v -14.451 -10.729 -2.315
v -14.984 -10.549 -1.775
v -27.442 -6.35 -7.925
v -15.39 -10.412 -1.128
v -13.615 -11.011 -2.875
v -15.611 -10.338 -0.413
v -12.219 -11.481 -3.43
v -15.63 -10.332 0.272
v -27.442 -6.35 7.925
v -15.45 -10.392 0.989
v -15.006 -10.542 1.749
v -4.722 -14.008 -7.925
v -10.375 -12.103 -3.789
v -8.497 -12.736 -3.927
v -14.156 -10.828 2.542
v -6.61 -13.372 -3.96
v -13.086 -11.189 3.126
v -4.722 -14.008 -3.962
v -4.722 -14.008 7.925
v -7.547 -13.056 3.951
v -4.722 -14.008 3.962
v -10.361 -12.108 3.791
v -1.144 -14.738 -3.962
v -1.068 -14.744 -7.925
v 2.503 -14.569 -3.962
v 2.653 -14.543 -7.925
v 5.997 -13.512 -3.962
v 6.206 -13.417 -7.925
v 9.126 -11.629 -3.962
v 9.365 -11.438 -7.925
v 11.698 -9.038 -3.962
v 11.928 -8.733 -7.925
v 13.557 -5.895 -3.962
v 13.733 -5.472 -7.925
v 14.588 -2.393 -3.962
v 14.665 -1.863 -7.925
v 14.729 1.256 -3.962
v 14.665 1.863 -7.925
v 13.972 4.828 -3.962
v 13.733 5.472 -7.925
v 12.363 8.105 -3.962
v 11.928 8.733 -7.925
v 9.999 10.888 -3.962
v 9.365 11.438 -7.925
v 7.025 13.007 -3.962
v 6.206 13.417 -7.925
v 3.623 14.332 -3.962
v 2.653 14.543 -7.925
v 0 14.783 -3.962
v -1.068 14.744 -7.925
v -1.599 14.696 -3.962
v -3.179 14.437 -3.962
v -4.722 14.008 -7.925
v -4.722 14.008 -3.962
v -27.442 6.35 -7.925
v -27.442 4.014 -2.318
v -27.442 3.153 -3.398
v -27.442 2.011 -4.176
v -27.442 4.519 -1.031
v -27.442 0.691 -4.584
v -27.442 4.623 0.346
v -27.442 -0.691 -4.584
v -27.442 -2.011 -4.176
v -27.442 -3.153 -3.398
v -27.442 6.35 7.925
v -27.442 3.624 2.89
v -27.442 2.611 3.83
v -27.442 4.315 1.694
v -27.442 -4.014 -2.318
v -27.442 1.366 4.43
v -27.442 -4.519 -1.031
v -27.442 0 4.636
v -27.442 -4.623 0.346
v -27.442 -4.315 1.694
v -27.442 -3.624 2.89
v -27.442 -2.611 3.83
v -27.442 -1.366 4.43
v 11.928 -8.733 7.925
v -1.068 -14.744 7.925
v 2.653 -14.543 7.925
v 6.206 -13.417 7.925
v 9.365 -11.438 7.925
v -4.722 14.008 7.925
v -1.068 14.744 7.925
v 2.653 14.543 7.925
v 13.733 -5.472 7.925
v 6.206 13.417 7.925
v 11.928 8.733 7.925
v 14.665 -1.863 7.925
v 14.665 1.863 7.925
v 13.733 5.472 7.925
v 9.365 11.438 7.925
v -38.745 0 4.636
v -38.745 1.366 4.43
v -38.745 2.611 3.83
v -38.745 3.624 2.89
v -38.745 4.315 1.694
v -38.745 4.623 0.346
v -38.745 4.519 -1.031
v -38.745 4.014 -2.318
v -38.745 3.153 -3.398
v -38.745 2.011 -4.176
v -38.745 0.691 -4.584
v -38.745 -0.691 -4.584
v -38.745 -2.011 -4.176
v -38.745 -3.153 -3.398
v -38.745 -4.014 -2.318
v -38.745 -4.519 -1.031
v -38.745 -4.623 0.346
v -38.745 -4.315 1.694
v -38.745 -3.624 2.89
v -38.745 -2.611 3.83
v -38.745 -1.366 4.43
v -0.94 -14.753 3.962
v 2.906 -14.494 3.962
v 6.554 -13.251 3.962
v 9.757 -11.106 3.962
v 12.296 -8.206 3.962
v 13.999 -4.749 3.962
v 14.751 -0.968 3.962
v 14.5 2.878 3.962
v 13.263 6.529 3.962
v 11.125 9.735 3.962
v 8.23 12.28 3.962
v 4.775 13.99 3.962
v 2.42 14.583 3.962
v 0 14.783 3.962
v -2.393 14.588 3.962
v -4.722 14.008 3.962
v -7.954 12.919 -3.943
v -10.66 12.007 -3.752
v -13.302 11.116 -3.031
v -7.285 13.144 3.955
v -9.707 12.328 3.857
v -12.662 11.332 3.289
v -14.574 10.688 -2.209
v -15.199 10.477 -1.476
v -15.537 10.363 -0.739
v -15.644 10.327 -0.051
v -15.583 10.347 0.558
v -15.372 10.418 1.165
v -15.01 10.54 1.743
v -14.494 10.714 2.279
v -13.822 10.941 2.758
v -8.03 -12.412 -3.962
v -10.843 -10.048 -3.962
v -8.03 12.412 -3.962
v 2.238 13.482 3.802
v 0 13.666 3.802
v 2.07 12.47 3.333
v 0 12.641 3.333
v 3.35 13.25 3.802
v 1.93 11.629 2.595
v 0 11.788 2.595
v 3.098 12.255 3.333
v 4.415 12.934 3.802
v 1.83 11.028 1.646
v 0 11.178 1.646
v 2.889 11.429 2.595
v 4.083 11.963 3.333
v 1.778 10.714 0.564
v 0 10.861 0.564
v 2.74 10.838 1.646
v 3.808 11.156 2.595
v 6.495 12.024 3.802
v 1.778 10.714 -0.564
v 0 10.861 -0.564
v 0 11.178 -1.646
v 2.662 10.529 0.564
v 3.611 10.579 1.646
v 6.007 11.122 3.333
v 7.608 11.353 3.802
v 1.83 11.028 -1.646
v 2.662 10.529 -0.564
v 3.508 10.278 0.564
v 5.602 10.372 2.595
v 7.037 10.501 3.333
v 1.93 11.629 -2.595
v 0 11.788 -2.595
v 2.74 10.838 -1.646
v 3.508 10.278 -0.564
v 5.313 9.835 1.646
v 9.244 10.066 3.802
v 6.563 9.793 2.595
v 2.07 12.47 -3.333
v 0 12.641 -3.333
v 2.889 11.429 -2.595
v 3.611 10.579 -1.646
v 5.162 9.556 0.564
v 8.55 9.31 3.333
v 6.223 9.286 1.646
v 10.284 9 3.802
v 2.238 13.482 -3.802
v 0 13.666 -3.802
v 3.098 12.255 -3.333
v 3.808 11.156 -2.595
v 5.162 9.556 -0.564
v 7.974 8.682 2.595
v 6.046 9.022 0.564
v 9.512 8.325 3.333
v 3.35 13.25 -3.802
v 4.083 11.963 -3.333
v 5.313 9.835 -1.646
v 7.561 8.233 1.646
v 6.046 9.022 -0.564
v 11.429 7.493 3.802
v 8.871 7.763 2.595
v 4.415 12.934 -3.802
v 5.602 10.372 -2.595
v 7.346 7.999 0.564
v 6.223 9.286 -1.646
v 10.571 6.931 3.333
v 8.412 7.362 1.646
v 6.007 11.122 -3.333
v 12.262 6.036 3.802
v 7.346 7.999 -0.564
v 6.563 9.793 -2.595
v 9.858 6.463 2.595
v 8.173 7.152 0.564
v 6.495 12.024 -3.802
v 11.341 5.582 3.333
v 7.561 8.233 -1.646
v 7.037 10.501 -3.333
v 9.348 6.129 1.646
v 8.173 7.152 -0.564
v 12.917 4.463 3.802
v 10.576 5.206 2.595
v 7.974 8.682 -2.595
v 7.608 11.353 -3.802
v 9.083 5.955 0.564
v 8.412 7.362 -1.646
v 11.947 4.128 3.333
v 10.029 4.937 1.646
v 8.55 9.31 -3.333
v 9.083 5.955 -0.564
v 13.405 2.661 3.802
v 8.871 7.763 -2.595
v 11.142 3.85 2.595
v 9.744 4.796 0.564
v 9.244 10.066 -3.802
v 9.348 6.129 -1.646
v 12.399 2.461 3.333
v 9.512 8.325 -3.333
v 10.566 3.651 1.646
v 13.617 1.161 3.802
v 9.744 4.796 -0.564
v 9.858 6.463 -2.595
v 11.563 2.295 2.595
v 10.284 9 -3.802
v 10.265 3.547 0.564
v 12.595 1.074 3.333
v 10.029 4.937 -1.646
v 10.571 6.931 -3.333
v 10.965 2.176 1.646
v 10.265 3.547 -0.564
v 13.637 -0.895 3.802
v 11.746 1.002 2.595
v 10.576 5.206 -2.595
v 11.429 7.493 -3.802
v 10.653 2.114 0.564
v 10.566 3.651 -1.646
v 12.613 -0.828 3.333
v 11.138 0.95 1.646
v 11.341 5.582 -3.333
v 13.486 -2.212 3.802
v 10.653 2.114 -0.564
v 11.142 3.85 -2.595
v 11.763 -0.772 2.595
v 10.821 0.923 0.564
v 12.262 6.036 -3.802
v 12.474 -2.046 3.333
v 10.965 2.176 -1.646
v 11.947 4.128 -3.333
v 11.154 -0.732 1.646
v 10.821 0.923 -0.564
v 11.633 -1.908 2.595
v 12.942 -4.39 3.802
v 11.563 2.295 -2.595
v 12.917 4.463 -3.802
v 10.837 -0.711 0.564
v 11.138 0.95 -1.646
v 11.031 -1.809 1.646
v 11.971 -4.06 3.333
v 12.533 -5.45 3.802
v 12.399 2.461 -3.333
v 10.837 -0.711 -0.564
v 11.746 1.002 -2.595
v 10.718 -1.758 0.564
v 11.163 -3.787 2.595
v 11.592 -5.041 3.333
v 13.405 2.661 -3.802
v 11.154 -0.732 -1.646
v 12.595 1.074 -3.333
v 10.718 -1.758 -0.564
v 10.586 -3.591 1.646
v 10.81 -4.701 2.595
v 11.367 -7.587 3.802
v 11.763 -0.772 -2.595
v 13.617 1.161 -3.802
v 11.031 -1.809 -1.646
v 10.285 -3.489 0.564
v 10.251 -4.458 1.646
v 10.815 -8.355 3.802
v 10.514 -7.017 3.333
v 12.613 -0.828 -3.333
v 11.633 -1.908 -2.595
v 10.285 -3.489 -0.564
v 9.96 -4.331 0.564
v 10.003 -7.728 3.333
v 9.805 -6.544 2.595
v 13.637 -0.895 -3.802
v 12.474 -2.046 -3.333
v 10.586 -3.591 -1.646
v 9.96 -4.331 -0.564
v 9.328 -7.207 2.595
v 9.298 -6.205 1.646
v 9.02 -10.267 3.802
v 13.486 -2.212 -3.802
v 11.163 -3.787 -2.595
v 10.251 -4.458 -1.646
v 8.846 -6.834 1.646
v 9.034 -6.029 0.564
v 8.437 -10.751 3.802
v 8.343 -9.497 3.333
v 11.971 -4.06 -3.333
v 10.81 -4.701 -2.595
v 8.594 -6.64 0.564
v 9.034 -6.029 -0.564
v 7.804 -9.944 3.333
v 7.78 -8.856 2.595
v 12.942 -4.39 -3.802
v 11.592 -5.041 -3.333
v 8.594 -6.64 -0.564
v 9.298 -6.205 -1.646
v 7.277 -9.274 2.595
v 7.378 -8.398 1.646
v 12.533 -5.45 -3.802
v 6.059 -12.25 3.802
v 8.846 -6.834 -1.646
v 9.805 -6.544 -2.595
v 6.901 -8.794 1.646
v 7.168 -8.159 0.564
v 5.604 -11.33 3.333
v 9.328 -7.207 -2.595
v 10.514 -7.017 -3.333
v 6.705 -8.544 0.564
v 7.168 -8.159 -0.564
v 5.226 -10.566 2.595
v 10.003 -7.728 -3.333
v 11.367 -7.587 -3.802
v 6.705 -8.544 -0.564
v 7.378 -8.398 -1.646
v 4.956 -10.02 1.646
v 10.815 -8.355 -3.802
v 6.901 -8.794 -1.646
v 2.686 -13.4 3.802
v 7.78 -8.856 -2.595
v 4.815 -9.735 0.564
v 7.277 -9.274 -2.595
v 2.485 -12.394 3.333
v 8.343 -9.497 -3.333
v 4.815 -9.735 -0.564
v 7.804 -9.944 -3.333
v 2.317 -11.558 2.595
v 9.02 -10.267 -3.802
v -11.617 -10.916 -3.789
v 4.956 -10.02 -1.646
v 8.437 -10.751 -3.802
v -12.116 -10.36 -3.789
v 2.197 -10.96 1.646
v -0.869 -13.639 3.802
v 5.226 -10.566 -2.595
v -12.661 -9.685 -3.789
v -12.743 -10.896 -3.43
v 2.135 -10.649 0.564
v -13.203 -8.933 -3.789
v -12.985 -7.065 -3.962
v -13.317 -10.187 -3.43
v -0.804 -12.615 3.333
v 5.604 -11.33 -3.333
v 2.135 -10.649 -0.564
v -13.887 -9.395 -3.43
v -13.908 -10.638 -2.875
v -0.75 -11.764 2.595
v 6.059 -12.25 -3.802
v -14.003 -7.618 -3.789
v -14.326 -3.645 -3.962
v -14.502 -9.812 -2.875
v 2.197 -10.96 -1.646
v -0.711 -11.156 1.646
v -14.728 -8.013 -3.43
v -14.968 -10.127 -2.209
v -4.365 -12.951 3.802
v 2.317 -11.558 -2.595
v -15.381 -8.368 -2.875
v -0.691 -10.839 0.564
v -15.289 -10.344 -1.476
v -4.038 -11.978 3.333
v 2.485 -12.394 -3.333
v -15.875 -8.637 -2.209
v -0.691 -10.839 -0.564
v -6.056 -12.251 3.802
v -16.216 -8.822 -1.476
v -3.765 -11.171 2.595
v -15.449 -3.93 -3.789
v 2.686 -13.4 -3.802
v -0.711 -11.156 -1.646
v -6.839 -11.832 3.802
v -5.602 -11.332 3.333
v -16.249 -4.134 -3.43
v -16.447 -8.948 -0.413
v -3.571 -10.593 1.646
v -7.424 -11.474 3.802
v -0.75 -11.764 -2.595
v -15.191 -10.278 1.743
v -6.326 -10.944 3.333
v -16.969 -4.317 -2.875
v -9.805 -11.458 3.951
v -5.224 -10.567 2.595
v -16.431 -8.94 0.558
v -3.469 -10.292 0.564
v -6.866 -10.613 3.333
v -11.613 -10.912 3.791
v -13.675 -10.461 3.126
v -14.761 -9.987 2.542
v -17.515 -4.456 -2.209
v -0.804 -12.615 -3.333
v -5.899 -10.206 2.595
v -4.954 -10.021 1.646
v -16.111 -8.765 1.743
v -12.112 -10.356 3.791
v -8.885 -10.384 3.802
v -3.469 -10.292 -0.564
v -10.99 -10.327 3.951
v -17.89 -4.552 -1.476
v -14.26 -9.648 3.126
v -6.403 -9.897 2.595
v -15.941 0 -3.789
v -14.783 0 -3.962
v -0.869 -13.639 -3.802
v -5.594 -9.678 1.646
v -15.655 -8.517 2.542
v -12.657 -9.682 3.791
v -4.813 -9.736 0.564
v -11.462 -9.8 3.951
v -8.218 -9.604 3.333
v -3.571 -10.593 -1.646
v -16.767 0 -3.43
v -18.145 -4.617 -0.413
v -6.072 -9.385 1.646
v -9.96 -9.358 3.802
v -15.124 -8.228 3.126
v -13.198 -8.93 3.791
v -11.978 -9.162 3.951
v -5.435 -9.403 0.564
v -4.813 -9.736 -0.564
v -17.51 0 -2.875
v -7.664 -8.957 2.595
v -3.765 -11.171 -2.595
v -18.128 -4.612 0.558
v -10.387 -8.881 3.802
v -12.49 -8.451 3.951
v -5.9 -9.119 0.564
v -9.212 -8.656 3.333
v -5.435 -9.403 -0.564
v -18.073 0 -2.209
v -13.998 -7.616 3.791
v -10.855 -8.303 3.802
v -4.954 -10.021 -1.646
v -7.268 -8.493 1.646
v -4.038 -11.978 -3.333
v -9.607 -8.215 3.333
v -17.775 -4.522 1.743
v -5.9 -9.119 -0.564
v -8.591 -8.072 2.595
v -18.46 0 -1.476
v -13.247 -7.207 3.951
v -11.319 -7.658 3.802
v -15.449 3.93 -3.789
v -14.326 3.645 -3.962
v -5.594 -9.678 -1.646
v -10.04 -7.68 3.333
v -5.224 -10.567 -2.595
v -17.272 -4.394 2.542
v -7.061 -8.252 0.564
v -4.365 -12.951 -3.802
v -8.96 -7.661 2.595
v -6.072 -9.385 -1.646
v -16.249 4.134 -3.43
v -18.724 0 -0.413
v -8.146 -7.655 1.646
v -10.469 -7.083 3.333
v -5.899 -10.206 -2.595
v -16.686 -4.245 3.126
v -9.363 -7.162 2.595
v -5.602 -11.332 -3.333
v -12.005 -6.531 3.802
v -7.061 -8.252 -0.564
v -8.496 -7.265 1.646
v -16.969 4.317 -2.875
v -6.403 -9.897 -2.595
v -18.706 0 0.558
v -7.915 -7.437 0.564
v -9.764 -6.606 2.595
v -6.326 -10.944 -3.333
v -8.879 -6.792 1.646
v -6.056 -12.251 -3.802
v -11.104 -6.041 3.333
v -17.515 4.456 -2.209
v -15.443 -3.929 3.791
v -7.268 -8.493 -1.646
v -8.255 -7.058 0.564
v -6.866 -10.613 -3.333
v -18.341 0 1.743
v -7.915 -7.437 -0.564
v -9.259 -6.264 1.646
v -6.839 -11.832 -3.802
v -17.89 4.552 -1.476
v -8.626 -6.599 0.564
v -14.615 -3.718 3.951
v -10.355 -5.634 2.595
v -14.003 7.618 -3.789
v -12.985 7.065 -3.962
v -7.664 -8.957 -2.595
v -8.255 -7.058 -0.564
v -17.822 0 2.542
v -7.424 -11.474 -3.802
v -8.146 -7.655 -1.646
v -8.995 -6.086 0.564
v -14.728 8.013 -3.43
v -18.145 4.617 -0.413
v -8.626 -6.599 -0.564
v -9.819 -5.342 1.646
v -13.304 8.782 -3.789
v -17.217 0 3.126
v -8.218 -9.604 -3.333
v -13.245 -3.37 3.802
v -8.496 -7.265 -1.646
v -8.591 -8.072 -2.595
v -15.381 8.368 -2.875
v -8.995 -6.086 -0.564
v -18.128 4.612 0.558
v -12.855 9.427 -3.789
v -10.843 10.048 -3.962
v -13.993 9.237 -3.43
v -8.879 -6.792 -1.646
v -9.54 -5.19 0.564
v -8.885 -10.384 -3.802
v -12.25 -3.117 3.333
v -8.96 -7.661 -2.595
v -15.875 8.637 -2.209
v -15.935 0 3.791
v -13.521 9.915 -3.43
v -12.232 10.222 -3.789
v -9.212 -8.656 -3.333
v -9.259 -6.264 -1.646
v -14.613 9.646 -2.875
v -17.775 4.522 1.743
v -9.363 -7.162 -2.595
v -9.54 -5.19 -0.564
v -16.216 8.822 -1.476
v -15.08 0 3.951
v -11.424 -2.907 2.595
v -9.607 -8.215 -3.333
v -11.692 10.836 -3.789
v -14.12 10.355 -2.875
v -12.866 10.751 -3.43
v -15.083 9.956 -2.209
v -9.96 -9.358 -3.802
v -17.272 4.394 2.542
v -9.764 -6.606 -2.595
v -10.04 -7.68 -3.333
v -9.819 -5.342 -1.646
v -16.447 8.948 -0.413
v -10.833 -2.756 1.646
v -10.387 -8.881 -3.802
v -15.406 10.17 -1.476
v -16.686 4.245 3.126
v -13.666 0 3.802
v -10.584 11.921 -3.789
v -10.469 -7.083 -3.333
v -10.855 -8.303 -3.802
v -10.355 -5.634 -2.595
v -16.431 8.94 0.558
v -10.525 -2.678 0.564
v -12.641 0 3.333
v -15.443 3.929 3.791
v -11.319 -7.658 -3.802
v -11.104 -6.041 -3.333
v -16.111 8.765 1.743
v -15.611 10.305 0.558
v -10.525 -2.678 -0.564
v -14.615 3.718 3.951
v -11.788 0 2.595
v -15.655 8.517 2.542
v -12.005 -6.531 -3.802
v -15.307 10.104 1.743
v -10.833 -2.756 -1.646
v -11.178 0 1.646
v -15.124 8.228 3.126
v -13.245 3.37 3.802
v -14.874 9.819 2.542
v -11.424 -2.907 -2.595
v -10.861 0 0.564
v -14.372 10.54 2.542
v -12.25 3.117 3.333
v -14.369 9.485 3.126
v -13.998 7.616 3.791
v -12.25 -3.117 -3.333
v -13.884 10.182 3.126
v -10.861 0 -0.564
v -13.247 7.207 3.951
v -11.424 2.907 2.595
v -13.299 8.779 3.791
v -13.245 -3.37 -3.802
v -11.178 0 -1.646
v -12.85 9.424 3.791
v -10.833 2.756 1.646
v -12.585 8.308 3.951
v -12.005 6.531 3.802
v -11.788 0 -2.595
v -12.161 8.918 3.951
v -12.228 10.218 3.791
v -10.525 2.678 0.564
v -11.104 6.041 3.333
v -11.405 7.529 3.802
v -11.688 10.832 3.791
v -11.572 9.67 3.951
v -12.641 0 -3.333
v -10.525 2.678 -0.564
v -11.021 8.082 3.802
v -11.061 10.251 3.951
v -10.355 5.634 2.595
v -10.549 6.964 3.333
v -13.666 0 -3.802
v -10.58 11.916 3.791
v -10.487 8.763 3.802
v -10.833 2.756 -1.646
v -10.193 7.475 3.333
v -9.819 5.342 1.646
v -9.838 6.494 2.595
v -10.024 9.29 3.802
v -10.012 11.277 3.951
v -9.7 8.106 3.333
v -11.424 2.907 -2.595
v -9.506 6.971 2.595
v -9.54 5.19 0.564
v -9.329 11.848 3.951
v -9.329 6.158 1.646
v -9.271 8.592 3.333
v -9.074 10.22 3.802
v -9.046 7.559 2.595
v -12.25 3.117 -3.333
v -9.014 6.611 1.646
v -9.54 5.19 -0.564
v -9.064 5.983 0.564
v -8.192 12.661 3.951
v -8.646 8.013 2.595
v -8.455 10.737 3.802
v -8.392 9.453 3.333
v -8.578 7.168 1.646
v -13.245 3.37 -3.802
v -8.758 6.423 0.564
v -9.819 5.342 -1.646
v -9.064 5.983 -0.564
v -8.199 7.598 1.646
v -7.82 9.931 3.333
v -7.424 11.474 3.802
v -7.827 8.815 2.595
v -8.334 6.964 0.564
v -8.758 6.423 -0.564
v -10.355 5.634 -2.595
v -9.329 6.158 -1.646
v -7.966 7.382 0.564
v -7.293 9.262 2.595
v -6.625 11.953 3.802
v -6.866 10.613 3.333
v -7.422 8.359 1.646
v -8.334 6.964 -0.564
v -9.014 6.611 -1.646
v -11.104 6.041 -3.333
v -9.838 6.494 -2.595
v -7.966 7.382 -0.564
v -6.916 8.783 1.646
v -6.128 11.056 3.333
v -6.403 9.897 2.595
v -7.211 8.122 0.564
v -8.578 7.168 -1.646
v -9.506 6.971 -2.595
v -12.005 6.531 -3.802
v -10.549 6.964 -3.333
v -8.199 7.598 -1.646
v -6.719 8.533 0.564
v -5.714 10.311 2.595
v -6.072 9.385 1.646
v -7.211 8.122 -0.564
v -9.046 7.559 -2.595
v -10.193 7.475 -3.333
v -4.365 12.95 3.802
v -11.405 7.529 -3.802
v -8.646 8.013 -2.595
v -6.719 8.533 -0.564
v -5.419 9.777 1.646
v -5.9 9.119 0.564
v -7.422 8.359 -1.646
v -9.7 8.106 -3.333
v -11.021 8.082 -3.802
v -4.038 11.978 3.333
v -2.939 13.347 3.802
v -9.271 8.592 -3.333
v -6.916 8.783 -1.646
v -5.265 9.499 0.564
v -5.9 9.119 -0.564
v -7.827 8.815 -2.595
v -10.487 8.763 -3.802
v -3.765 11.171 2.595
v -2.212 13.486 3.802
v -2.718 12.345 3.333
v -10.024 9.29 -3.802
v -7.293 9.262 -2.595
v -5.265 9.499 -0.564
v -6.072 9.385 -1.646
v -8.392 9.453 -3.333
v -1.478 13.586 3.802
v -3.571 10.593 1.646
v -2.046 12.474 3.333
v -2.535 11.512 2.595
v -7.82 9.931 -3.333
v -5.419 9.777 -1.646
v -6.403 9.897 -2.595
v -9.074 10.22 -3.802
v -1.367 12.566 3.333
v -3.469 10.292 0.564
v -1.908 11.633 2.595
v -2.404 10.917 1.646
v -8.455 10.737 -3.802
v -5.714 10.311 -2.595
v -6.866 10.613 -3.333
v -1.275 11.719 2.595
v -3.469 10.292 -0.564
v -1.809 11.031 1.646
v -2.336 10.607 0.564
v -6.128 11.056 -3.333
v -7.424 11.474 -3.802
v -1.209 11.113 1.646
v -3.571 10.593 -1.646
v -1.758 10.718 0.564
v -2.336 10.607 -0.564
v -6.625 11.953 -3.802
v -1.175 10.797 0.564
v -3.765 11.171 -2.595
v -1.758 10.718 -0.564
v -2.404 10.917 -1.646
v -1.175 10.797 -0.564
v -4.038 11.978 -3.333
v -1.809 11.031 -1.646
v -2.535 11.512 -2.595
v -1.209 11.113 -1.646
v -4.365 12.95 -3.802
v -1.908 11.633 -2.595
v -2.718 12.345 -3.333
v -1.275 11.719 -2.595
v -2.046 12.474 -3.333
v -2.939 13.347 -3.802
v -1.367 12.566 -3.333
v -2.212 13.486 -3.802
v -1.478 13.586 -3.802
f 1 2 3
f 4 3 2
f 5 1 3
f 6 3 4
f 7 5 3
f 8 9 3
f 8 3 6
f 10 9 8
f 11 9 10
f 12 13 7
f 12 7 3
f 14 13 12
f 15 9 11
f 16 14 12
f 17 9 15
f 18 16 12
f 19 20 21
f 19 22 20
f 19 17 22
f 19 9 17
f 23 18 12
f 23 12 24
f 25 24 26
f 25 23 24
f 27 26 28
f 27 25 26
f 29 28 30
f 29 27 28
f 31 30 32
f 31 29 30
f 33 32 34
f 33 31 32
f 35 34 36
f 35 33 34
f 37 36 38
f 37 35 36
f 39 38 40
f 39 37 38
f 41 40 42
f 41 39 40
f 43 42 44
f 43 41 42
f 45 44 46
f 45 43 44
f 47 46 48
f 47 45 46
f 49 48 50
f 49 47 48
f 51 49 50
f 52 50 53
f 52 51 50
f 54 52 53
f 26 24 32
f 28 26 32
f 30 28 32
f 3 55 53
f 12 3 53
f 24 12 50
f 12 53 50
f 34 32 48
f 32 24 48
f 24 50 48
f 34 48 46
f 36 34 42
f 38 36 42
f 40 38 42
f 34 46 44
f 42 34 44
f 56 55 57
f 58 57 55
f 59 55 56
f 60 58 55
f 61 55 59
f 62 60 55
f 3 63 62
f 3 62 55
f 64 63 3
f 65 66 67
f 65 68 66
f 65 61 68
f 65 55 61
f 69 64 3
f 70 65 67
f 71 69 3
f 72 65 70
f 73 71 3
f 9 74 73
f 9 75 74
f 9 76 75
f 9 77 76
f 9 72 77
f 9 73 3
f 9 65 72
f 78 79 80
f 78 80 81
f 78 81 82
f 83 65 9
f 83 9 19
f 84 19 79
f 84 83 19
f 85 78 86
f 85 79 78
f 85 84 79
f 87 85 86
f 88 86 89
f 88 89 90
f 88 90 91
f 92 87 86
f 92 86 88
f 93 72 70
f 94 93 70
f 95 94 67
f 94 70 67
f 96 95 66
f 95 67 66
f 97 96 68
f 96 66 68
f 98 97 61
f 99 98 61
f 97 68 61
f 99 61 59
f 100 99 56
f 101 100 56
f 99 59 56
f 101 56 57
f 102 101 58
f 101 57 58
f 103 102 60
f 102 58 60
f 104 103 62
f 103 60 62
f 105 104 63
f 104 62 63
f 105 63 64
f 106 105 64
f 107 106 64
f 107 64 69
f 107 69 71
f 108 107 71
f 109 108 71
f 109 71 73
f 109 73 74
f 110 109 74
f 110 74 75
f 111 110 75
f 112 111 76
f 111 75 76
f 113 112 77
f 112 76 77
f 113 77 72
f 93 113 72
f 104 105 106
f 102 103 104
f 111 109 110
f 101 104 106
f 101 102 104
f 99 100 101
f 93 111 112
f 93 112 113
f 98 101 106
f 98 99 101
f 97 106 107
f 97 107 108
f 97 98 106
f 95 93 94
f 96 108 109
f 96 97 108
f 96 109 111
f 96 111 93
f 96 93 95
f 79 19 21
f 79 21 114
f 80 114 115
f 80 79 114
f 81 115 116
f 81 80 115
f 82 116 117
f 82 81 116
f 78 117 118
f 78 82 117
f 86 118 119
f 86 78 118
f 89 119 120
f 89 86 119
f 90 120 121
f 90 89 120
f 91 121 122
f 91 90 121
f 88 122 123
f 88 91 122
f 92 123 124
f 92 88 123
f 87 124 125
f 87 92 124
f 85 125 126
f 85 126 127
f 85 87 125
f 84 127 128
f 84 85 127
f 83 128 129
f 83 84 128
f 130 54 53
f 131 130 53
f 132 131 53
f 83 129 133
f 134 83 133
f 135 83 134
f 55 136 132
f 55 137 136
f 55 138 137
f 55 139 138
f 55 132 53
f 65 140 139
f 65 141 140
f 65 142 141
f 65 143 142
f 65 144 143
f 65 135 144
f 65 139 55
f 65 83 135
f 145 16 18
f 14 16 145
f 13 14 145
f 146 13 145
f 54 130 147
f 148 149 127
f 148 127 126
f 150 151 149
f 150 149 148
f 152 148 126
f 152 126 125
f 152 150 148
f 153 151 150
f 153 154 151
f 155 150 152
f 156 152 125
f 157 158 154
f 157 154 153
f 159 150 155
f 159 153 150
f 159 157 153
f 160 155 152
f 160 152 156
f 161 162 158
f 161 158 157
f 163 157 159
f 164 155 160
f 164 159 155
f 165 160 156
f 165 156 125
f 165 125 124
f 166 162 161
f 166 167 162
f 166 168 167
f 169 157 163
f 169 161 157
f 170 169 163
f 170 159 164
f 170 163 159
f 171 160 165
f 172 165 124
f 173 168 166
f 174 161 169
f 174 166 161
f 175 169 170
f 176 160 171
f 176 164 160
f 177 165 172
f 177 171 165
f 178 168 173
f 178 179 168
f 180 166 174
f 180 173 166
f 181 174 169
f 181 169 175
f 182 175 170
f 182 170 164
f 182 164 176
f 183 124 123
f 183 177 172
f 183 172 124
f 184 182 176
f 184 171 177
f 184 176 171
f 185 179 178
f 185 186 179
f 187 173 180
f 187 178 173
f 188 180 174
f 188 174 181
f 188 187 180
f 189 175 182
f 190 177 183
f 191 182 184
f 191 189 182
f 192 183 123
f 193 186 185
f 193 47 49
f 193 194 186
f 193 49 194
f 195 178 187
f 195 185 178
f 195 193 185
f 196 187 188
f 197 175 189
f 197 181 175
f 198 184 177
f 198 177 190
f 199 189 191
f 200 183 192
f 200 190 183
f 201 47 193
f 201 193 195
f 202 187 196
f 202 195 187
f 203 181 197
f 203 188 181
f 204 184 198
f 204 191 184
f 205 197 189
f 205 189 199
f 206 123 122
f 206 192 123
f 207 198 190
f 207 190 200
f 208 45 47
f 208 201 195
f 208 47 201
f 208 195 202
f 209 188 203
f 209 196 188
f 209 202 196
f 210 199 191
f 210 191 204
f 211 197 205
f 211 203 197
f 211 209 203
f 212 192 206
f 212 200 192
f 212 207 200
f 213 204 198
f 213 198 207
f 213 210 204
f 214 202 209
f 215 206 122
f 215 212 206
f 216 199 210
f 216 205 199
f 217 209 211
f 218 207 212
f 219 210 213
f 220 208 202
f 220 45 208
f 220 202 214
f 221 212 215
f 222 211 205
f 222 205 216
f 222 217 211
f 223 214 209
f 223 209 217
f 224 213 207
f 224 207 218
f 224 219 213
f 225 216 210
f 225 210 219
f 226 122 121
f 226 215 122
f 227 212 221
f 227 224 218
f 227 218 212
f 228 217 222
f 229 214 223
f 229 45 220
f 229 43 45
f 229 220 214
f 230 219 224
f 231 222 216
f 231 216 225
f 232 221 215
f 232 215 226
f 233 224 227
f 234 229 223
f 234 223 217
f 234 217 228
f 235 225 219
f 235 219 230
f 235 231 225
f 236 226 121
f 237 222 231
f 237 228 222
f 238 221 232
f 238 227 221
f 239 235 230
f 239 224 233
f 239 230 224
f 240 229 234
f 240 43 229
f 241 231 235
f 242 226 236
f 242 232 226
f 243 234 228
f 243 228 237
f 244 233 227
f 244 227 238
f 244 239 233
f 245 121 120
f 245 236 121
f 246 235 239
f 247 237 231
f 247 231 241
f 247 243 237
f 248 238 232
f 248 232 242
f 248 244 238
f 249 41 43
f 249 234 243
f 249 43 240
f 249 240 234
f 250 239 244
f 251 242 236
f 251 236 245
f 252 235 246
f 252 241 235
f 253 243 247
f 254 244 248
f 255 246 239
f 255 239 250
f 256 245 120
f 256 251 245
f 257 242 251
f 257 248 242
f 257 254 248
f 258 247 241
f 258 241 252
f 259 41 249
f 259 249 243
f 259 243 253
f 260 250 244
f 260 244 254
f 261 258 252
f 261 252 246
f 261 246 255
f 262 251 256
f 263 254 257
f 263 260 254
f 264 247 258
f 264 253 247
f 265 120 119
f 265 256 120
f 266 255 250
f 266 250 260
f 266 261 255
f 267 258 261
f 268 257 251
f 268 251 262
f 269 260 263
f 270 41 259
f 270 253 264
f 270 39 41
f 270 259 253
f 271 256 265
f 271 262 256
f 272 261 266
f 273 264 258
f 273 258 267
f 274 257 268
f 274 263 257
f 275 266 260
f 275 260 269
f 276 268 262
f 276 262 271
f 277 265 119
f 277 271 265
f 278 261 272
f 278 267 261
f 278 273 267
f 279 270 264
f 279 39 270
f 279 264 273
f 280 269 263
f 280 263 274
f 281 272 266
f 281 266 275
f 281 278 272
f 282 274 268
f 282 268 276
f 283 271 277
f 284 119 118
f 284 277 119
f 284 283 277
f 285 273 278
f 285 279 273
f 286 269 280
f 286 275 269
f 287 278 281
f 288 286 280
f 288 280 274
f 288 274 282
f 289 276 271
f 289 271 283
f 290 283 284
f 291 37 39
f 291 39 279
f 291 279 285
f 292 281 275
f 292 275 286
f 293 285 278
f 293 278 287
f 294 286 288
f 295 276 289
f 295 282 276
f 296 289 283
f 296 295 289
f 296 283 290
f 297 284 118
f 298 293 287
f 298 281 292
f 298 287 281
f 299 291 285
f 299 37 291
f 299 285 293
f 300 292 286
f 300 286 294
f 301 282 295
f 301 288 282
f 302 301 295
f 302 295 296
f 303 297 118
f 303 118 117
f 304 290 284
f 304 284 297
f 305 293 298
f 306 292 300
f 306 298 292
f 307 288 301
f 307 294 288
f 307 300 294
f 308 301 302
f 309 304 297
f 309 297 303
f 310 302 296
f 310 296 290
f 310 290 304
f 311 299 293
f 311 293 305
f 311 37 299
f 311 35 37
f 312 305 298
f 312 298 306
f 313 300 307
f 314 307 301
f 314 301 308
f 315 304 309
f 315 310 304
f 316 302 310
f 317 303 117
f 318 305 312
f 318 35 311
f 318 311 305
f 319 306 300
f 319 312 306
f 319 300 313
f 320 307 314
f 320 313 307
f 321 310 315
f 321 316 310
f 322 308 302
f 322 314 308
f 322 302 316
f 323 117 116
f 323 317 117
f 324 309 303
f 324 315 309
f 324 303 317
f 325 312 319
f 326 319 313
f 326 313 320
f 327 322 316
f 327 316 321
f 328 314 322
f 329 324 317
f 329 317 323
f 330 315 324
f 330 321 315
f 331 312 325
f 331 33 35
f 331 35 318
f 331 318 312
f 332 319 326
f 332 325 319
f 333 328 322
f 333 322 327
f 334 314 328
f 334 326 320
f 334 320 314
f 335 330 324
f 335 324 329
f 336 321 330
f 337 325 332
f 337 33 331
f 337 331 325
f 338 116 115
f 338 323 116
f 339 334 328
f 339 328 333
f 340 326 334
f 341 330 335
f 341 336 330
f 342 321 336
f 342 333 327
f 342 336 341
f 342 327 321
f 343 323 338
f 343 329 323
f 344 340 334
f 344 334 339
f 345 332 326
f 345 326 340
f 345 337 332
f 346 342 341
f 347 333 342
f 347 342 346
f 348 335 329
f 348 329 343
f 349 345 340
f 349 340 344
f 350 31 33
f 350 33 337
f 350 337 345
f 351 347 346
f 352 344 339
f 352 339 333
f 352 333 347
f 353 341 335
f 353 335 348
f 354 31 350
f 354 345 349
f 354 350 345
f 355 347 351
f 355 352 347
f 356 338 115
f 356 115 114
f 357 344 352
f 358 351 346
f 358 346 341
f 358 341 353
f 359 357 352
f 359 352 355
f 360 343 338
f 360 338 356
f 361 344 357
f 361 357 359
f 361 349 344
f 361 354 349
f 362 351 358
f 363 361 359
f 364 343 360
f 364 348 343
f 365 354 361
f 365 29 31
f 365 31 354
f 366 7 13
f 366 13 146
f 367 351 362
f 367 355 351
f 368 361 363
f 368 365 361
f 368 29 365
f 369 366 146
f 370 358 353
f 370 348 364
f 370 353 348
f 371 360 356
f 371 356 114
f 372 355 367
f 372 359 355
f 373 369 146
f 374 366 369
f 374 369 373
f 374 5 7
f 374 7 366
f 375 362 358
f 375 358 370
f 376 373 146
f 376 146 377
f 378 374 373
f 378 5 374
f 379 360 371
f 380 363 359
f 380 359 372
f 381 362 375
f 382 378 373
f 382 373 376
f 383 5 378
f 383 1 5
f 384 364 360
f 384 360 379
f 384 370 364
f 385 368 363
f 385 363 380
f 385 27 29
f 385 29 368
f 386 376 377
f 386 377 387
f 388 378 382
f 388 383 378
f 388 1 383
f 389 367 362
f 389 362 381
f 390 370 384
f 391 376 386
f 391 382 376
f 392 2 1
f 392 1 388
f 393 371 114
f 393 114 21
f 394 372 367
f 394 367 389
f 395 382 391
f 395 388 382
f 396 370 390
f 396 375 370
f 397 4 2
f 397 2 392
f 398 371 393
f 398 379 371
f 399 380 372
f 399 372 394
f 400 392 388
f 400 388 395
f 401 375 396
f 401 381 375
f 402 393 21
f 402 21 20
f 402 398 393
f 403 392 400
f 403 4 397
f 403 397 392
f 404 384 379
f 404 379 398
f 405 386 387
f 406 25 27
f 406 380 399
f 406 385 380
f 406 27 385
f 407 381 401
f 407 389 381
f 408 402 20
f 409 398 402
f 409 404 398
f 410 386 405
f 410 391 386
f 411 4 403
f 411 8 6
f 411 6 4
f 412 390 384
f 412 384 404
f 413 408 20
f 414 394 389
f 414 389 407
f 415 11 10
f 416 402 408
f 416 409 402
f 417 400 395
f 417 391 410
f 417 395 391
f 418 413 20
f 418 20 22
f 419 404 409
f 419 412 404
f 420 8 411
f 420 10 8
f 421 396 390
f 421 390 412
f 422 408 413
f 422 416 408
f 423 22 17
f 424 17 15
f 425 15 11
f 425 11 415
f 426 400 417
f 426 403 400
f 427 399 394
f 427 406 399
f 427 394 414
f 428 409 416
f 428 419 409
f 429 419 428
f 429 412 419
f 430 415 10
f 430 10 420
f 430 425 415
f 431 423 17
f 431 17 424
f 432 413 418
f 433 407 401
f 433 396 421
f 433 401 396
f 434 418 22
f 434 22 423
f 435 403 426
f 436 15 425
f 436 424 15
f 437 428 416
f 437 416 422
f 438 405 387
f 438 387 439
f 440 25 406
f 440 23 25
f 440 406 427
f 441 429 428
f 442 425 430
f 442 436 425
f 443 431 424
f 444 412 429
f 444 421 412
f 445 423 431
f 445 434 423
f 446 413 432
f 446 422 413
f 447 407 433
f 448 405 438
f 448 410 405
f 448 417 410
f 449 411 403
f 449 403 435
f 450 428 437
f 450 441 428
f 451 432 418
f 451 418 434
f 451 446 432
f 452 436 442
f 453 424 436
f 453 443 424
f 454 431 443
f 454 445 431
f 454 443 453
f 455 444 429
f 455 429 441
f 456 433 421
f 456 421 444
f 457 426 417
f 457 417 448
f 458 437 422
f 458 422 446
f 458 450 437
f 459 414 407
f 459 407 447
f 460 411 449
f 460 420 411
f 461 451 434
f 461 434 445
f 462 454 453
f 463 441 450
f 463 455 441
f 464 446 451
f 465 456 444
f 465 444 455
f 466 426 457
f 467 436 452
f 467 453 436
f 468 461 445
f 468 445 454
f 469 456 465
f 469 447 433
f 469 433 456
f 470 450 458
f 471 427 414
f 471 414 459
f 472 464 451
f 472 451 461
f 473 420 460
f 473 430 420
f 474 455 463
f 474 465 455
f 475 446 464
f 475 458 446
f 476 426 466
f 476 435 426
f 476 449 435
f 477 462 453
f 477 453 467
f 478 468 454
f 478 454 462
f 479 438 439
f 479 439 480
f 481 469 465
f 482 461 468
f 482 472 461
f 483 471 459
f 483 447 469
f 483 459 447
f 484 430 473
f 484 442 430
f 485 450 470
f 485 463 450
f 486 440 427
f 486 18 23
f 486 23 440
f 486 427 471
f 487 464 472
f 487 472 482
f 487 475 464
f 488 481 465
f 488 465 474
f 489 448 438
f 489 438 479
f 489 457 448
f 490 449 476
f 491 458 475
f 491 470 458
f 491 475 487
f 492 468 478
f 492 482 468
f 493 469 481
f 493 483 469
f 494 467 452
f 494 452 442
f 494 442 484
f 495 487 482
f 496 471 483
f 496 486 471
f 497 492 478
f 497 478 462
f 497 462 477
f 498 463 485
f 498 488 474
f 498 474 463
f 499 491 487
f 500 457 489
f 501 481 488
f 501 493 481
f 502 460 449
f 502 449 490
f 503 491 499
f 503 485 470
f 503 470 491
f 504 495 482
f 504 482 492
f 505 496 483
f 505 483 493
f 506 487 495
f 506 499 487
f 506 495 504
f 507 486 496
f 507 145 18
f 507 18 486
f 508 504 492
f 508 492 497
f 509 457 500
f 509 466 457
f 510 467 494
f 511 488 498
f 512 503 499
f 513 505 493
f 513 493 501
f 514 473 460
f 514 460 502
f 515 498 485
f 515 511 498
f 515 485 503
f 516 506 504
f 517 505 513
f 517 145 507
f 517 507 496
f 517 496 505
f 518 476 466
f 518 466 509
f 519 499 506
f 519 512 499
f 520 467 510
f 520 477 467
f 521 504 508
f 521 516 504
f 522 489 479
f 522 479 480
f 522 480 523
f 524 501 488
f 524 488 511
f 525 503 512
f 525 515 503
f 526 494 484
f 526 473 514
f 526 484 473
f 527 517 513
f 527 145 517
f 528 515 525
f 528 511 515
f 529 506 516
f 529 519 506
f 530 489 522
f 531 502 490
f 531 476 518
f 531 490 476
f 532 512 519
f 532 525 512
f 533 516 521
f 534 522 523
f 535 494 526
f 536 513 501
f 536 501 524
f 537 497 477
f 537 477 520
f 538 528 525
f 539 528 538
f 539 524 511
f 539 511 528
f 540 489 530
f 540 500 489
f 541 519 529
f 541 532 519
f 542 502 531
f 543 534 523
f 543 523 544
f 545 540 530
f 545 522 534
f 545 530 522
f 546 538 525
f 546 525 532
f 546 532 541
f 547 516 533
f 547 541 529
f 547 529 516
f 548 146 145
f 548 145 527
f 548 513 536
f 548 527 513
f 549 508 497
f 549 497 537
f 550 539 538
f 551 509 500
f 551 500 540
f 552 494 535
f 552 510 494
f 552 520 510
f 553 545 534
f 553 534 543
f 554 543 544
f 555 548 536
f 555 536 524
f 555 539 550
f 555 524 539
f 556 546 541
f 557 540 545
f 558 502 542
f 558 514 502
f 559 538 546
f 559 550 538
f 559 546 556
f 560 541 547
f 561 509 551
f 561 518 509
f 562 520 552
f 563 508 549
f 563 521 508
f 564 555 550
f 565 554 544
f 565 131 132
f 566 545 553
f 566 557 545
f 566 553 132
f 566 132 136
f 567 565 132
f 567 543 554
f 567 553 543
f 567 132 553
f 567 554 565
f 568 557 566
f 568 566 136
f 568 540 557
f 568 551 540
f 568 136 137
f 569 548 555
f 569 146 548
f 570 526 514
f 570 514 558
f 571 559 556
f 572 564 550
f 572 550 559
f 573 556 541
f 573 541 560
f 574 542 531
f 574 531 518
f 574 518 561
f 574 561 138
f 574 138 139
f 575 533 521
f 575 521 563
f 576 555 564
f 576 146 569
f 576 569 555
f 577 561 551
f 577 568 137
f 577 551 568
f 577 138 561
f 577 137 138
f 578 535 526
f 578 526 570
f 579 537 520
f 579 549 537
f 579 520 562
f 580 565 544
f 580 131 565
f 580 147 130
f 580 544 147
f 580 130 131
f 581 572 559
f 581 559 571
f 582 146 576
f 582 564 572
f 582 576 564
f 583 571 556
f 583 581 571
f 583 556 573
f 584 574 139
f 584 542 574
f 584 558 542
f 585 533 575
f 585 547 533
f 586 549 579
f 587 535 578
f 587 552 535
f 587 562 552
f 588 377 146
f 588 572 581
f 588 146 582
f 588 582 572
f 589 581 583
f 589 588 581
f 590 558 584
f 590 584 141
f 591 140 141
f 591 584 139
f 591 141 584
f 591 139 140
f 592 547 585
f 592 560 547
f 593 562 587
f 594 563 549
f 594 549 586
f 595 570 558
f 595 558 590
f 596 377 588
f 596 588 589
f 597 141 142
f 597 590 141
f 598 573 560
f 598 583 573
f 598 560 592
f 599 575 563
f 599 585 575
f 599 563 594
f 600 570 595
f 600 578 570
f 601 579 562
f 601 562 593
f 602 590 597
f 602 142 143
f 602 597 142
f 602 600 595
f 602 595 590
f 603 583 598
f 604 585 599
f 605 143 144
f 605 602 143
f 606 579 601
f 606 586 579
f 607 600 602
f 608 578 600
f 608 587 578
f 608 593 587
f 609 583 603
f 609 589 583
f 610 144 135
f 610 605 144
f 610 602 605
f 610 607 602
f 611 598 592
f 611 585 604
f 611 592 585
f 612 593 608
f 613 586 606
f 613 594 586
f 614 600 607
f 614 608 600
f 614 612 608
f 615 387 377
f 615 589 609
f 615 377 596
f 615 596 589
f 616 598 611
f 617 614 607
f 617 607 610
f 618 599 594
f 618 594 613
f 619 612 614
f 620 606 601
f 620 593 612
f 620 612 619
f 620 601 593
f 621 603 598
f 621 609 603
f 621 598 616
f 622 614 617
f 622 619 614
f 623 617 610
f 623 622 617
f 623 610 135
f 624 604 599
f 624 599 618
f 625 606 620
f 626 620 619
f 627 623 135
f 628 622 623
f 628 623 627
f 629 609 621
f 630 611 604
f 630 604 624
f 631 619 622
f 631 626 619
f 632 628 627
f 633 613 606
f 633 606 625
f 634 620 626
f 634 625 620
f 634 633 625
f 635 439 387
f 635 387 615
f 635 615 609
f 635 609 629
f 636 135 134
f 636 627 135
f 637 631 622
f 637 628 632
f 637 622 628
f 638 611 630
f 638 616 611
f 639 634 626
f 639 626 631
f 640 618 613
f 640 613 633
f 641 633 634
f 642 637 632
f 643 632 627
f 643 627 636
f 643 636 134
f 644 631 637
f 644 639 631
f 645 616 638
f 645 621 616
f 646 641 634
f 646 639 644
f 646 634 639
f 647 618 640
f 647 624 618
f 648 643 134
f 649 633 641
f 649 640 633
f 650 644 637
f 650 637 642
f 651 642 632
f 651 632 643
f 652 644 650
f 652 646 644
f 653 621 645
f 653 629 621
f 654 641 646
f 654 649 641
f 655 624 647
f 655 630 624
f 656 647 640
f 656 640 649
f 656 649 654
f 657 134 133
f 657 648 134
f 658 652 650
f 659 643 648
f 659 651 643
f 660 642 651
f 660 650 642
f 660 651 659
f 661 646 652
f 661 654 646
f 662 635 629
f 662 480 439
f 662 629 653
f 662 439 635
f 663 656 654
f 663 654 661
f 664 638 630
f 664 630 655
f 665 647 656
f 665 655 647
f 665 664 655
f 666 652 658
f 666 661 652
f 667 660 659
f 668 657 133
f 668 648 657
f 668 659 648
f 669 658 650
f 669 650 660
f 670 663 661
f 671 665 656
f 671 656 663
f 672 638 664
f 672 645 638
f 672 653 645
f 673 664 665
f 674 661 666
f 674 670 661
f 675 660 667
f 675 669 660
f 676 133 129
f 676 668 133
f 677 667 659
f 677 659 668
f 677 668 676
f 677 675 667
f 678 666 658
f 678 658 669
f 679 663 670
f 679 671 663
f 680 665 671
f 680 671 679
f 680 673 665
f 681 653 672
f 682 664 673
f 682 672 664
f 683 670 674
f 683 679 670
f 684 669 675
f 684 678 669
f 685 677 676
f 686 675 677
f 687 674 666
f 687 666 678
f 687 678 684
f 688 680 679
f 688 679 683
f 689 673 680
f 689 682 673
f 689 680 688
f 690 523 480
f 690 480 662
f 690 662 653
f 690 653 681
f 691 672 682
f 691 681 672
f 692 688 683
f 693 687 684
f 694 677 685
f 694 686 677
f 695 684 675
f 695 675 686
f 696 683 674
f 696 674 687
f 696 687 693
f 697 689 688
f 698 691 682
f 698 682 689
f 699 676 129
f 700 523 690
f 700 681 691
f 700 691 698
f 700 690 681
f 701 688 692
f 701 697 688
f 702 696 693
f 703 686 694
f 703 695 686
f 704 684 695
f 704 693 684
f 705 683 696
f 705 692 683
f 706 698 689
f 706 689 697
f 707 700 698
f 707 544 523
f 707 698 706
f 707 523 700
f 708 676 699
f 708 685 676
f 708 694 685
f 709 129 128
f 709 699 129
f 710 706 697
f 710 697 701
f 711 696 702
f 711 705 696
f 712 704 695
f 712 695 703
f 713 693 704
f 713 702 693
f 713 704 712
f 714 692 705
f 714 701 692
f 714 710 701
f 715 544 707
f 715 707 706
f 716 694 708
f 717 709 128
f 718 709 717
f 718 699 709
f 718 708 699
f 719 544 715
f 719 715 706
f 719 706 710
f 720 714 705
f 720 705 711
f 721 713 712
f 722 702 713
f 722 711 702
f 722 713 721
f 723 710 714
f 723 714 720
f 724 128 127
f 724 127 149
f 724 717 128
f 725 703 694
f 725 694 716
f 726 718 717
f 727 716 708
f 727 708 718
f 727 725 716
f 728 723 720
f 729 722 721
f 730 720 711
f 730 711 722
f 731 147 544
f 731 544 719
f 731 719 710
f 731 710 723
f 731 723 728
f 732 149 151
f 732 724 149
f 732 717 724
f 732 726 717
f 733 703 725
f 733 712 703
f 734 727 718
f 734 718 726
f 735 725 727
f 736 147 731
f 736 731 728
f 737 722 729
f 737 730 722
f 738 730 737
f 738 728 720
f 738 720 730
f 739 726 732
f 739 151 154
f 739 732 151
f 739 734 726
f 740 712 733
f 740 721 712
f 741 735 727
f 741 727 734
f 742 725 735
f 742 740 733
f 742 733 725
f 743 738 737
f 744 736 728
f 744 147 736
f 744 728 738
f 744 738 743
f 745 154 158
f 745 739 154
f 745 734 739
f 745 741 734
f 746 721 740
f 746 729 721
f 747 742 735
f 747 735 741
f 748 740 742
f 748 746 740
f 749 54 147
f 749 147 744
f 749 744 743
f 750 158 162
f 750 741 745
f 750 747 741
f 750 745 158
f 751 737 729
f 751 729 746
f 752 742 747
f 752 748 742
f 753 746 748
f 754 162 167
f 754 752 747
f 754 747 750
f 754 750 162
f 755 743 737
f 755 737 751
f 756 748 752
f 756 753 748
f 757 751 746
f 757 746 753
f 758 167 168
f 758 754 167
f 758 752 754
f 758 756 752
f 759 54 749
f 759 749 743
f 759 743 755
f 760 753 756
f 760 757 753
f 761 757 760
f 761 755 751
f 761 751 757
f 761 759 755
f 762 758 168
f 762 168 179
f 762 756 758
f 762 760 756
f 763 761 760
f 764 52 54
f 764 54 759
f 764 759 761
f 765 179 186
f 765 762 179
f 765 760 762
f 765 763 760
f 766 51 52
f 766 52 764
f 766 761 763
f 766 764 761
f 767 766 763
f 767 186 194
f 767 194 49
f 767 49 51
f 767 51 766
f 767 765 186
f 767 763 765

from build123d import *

# Parameters (mm, degrees)
BOSS_EXTRUDE1_DEPTH = 7.9248
SKETCH2_R           = 4.6355
BOSS_EXTRUDE2_DEPTH = 11.303
SKETCH6_R           = 3.9624


with BuildPart() as part:
    # Sketch1 → Boss-Extrude1 (new body, symmetric)
    with BuildSketch(Plane.XY):
        with BuildLine():
            Line((-27.441594764, 6.35), (-27.441594764, -6.35))
            Line((-27.441594764, -6.35), (-4.72195802, -14.00836494))
            ThreePointArc((-4.72195802, -14.00836494), (14.7828, 0), (-4.72195802, 14.00836494))
            Line((-4.72195802, 14.00836494), (-27.441594764, 6.35))
        make_face()
    extrude(amount=BOSS_EXTRUDE1_DEPTH, both=True)

    # Sketch2 → Boss-Extrude2 (add)
    with BuildSketch(Plane.ZY.offset(27.441594764)):
        Circle(SKETCH2_R)
    extrude(amount=BOSS_EXTRUDE2_DEPTH)

    # Sketch6 → Cut-Revolve1 (revolve, cut)
    with BuildSketch(Plane(origin=(0, 0, 0), x_dir=(0, 0, -1), z_dir=(1, 0, 0))):
        with Locations((0, 14.7828)):
            Circle(SKETCH6_R)
    revolve(axis=Axis((0, 0, 0), (0, 0, -1)), mode=Mode.SUBTRACT)


solid = part.part
